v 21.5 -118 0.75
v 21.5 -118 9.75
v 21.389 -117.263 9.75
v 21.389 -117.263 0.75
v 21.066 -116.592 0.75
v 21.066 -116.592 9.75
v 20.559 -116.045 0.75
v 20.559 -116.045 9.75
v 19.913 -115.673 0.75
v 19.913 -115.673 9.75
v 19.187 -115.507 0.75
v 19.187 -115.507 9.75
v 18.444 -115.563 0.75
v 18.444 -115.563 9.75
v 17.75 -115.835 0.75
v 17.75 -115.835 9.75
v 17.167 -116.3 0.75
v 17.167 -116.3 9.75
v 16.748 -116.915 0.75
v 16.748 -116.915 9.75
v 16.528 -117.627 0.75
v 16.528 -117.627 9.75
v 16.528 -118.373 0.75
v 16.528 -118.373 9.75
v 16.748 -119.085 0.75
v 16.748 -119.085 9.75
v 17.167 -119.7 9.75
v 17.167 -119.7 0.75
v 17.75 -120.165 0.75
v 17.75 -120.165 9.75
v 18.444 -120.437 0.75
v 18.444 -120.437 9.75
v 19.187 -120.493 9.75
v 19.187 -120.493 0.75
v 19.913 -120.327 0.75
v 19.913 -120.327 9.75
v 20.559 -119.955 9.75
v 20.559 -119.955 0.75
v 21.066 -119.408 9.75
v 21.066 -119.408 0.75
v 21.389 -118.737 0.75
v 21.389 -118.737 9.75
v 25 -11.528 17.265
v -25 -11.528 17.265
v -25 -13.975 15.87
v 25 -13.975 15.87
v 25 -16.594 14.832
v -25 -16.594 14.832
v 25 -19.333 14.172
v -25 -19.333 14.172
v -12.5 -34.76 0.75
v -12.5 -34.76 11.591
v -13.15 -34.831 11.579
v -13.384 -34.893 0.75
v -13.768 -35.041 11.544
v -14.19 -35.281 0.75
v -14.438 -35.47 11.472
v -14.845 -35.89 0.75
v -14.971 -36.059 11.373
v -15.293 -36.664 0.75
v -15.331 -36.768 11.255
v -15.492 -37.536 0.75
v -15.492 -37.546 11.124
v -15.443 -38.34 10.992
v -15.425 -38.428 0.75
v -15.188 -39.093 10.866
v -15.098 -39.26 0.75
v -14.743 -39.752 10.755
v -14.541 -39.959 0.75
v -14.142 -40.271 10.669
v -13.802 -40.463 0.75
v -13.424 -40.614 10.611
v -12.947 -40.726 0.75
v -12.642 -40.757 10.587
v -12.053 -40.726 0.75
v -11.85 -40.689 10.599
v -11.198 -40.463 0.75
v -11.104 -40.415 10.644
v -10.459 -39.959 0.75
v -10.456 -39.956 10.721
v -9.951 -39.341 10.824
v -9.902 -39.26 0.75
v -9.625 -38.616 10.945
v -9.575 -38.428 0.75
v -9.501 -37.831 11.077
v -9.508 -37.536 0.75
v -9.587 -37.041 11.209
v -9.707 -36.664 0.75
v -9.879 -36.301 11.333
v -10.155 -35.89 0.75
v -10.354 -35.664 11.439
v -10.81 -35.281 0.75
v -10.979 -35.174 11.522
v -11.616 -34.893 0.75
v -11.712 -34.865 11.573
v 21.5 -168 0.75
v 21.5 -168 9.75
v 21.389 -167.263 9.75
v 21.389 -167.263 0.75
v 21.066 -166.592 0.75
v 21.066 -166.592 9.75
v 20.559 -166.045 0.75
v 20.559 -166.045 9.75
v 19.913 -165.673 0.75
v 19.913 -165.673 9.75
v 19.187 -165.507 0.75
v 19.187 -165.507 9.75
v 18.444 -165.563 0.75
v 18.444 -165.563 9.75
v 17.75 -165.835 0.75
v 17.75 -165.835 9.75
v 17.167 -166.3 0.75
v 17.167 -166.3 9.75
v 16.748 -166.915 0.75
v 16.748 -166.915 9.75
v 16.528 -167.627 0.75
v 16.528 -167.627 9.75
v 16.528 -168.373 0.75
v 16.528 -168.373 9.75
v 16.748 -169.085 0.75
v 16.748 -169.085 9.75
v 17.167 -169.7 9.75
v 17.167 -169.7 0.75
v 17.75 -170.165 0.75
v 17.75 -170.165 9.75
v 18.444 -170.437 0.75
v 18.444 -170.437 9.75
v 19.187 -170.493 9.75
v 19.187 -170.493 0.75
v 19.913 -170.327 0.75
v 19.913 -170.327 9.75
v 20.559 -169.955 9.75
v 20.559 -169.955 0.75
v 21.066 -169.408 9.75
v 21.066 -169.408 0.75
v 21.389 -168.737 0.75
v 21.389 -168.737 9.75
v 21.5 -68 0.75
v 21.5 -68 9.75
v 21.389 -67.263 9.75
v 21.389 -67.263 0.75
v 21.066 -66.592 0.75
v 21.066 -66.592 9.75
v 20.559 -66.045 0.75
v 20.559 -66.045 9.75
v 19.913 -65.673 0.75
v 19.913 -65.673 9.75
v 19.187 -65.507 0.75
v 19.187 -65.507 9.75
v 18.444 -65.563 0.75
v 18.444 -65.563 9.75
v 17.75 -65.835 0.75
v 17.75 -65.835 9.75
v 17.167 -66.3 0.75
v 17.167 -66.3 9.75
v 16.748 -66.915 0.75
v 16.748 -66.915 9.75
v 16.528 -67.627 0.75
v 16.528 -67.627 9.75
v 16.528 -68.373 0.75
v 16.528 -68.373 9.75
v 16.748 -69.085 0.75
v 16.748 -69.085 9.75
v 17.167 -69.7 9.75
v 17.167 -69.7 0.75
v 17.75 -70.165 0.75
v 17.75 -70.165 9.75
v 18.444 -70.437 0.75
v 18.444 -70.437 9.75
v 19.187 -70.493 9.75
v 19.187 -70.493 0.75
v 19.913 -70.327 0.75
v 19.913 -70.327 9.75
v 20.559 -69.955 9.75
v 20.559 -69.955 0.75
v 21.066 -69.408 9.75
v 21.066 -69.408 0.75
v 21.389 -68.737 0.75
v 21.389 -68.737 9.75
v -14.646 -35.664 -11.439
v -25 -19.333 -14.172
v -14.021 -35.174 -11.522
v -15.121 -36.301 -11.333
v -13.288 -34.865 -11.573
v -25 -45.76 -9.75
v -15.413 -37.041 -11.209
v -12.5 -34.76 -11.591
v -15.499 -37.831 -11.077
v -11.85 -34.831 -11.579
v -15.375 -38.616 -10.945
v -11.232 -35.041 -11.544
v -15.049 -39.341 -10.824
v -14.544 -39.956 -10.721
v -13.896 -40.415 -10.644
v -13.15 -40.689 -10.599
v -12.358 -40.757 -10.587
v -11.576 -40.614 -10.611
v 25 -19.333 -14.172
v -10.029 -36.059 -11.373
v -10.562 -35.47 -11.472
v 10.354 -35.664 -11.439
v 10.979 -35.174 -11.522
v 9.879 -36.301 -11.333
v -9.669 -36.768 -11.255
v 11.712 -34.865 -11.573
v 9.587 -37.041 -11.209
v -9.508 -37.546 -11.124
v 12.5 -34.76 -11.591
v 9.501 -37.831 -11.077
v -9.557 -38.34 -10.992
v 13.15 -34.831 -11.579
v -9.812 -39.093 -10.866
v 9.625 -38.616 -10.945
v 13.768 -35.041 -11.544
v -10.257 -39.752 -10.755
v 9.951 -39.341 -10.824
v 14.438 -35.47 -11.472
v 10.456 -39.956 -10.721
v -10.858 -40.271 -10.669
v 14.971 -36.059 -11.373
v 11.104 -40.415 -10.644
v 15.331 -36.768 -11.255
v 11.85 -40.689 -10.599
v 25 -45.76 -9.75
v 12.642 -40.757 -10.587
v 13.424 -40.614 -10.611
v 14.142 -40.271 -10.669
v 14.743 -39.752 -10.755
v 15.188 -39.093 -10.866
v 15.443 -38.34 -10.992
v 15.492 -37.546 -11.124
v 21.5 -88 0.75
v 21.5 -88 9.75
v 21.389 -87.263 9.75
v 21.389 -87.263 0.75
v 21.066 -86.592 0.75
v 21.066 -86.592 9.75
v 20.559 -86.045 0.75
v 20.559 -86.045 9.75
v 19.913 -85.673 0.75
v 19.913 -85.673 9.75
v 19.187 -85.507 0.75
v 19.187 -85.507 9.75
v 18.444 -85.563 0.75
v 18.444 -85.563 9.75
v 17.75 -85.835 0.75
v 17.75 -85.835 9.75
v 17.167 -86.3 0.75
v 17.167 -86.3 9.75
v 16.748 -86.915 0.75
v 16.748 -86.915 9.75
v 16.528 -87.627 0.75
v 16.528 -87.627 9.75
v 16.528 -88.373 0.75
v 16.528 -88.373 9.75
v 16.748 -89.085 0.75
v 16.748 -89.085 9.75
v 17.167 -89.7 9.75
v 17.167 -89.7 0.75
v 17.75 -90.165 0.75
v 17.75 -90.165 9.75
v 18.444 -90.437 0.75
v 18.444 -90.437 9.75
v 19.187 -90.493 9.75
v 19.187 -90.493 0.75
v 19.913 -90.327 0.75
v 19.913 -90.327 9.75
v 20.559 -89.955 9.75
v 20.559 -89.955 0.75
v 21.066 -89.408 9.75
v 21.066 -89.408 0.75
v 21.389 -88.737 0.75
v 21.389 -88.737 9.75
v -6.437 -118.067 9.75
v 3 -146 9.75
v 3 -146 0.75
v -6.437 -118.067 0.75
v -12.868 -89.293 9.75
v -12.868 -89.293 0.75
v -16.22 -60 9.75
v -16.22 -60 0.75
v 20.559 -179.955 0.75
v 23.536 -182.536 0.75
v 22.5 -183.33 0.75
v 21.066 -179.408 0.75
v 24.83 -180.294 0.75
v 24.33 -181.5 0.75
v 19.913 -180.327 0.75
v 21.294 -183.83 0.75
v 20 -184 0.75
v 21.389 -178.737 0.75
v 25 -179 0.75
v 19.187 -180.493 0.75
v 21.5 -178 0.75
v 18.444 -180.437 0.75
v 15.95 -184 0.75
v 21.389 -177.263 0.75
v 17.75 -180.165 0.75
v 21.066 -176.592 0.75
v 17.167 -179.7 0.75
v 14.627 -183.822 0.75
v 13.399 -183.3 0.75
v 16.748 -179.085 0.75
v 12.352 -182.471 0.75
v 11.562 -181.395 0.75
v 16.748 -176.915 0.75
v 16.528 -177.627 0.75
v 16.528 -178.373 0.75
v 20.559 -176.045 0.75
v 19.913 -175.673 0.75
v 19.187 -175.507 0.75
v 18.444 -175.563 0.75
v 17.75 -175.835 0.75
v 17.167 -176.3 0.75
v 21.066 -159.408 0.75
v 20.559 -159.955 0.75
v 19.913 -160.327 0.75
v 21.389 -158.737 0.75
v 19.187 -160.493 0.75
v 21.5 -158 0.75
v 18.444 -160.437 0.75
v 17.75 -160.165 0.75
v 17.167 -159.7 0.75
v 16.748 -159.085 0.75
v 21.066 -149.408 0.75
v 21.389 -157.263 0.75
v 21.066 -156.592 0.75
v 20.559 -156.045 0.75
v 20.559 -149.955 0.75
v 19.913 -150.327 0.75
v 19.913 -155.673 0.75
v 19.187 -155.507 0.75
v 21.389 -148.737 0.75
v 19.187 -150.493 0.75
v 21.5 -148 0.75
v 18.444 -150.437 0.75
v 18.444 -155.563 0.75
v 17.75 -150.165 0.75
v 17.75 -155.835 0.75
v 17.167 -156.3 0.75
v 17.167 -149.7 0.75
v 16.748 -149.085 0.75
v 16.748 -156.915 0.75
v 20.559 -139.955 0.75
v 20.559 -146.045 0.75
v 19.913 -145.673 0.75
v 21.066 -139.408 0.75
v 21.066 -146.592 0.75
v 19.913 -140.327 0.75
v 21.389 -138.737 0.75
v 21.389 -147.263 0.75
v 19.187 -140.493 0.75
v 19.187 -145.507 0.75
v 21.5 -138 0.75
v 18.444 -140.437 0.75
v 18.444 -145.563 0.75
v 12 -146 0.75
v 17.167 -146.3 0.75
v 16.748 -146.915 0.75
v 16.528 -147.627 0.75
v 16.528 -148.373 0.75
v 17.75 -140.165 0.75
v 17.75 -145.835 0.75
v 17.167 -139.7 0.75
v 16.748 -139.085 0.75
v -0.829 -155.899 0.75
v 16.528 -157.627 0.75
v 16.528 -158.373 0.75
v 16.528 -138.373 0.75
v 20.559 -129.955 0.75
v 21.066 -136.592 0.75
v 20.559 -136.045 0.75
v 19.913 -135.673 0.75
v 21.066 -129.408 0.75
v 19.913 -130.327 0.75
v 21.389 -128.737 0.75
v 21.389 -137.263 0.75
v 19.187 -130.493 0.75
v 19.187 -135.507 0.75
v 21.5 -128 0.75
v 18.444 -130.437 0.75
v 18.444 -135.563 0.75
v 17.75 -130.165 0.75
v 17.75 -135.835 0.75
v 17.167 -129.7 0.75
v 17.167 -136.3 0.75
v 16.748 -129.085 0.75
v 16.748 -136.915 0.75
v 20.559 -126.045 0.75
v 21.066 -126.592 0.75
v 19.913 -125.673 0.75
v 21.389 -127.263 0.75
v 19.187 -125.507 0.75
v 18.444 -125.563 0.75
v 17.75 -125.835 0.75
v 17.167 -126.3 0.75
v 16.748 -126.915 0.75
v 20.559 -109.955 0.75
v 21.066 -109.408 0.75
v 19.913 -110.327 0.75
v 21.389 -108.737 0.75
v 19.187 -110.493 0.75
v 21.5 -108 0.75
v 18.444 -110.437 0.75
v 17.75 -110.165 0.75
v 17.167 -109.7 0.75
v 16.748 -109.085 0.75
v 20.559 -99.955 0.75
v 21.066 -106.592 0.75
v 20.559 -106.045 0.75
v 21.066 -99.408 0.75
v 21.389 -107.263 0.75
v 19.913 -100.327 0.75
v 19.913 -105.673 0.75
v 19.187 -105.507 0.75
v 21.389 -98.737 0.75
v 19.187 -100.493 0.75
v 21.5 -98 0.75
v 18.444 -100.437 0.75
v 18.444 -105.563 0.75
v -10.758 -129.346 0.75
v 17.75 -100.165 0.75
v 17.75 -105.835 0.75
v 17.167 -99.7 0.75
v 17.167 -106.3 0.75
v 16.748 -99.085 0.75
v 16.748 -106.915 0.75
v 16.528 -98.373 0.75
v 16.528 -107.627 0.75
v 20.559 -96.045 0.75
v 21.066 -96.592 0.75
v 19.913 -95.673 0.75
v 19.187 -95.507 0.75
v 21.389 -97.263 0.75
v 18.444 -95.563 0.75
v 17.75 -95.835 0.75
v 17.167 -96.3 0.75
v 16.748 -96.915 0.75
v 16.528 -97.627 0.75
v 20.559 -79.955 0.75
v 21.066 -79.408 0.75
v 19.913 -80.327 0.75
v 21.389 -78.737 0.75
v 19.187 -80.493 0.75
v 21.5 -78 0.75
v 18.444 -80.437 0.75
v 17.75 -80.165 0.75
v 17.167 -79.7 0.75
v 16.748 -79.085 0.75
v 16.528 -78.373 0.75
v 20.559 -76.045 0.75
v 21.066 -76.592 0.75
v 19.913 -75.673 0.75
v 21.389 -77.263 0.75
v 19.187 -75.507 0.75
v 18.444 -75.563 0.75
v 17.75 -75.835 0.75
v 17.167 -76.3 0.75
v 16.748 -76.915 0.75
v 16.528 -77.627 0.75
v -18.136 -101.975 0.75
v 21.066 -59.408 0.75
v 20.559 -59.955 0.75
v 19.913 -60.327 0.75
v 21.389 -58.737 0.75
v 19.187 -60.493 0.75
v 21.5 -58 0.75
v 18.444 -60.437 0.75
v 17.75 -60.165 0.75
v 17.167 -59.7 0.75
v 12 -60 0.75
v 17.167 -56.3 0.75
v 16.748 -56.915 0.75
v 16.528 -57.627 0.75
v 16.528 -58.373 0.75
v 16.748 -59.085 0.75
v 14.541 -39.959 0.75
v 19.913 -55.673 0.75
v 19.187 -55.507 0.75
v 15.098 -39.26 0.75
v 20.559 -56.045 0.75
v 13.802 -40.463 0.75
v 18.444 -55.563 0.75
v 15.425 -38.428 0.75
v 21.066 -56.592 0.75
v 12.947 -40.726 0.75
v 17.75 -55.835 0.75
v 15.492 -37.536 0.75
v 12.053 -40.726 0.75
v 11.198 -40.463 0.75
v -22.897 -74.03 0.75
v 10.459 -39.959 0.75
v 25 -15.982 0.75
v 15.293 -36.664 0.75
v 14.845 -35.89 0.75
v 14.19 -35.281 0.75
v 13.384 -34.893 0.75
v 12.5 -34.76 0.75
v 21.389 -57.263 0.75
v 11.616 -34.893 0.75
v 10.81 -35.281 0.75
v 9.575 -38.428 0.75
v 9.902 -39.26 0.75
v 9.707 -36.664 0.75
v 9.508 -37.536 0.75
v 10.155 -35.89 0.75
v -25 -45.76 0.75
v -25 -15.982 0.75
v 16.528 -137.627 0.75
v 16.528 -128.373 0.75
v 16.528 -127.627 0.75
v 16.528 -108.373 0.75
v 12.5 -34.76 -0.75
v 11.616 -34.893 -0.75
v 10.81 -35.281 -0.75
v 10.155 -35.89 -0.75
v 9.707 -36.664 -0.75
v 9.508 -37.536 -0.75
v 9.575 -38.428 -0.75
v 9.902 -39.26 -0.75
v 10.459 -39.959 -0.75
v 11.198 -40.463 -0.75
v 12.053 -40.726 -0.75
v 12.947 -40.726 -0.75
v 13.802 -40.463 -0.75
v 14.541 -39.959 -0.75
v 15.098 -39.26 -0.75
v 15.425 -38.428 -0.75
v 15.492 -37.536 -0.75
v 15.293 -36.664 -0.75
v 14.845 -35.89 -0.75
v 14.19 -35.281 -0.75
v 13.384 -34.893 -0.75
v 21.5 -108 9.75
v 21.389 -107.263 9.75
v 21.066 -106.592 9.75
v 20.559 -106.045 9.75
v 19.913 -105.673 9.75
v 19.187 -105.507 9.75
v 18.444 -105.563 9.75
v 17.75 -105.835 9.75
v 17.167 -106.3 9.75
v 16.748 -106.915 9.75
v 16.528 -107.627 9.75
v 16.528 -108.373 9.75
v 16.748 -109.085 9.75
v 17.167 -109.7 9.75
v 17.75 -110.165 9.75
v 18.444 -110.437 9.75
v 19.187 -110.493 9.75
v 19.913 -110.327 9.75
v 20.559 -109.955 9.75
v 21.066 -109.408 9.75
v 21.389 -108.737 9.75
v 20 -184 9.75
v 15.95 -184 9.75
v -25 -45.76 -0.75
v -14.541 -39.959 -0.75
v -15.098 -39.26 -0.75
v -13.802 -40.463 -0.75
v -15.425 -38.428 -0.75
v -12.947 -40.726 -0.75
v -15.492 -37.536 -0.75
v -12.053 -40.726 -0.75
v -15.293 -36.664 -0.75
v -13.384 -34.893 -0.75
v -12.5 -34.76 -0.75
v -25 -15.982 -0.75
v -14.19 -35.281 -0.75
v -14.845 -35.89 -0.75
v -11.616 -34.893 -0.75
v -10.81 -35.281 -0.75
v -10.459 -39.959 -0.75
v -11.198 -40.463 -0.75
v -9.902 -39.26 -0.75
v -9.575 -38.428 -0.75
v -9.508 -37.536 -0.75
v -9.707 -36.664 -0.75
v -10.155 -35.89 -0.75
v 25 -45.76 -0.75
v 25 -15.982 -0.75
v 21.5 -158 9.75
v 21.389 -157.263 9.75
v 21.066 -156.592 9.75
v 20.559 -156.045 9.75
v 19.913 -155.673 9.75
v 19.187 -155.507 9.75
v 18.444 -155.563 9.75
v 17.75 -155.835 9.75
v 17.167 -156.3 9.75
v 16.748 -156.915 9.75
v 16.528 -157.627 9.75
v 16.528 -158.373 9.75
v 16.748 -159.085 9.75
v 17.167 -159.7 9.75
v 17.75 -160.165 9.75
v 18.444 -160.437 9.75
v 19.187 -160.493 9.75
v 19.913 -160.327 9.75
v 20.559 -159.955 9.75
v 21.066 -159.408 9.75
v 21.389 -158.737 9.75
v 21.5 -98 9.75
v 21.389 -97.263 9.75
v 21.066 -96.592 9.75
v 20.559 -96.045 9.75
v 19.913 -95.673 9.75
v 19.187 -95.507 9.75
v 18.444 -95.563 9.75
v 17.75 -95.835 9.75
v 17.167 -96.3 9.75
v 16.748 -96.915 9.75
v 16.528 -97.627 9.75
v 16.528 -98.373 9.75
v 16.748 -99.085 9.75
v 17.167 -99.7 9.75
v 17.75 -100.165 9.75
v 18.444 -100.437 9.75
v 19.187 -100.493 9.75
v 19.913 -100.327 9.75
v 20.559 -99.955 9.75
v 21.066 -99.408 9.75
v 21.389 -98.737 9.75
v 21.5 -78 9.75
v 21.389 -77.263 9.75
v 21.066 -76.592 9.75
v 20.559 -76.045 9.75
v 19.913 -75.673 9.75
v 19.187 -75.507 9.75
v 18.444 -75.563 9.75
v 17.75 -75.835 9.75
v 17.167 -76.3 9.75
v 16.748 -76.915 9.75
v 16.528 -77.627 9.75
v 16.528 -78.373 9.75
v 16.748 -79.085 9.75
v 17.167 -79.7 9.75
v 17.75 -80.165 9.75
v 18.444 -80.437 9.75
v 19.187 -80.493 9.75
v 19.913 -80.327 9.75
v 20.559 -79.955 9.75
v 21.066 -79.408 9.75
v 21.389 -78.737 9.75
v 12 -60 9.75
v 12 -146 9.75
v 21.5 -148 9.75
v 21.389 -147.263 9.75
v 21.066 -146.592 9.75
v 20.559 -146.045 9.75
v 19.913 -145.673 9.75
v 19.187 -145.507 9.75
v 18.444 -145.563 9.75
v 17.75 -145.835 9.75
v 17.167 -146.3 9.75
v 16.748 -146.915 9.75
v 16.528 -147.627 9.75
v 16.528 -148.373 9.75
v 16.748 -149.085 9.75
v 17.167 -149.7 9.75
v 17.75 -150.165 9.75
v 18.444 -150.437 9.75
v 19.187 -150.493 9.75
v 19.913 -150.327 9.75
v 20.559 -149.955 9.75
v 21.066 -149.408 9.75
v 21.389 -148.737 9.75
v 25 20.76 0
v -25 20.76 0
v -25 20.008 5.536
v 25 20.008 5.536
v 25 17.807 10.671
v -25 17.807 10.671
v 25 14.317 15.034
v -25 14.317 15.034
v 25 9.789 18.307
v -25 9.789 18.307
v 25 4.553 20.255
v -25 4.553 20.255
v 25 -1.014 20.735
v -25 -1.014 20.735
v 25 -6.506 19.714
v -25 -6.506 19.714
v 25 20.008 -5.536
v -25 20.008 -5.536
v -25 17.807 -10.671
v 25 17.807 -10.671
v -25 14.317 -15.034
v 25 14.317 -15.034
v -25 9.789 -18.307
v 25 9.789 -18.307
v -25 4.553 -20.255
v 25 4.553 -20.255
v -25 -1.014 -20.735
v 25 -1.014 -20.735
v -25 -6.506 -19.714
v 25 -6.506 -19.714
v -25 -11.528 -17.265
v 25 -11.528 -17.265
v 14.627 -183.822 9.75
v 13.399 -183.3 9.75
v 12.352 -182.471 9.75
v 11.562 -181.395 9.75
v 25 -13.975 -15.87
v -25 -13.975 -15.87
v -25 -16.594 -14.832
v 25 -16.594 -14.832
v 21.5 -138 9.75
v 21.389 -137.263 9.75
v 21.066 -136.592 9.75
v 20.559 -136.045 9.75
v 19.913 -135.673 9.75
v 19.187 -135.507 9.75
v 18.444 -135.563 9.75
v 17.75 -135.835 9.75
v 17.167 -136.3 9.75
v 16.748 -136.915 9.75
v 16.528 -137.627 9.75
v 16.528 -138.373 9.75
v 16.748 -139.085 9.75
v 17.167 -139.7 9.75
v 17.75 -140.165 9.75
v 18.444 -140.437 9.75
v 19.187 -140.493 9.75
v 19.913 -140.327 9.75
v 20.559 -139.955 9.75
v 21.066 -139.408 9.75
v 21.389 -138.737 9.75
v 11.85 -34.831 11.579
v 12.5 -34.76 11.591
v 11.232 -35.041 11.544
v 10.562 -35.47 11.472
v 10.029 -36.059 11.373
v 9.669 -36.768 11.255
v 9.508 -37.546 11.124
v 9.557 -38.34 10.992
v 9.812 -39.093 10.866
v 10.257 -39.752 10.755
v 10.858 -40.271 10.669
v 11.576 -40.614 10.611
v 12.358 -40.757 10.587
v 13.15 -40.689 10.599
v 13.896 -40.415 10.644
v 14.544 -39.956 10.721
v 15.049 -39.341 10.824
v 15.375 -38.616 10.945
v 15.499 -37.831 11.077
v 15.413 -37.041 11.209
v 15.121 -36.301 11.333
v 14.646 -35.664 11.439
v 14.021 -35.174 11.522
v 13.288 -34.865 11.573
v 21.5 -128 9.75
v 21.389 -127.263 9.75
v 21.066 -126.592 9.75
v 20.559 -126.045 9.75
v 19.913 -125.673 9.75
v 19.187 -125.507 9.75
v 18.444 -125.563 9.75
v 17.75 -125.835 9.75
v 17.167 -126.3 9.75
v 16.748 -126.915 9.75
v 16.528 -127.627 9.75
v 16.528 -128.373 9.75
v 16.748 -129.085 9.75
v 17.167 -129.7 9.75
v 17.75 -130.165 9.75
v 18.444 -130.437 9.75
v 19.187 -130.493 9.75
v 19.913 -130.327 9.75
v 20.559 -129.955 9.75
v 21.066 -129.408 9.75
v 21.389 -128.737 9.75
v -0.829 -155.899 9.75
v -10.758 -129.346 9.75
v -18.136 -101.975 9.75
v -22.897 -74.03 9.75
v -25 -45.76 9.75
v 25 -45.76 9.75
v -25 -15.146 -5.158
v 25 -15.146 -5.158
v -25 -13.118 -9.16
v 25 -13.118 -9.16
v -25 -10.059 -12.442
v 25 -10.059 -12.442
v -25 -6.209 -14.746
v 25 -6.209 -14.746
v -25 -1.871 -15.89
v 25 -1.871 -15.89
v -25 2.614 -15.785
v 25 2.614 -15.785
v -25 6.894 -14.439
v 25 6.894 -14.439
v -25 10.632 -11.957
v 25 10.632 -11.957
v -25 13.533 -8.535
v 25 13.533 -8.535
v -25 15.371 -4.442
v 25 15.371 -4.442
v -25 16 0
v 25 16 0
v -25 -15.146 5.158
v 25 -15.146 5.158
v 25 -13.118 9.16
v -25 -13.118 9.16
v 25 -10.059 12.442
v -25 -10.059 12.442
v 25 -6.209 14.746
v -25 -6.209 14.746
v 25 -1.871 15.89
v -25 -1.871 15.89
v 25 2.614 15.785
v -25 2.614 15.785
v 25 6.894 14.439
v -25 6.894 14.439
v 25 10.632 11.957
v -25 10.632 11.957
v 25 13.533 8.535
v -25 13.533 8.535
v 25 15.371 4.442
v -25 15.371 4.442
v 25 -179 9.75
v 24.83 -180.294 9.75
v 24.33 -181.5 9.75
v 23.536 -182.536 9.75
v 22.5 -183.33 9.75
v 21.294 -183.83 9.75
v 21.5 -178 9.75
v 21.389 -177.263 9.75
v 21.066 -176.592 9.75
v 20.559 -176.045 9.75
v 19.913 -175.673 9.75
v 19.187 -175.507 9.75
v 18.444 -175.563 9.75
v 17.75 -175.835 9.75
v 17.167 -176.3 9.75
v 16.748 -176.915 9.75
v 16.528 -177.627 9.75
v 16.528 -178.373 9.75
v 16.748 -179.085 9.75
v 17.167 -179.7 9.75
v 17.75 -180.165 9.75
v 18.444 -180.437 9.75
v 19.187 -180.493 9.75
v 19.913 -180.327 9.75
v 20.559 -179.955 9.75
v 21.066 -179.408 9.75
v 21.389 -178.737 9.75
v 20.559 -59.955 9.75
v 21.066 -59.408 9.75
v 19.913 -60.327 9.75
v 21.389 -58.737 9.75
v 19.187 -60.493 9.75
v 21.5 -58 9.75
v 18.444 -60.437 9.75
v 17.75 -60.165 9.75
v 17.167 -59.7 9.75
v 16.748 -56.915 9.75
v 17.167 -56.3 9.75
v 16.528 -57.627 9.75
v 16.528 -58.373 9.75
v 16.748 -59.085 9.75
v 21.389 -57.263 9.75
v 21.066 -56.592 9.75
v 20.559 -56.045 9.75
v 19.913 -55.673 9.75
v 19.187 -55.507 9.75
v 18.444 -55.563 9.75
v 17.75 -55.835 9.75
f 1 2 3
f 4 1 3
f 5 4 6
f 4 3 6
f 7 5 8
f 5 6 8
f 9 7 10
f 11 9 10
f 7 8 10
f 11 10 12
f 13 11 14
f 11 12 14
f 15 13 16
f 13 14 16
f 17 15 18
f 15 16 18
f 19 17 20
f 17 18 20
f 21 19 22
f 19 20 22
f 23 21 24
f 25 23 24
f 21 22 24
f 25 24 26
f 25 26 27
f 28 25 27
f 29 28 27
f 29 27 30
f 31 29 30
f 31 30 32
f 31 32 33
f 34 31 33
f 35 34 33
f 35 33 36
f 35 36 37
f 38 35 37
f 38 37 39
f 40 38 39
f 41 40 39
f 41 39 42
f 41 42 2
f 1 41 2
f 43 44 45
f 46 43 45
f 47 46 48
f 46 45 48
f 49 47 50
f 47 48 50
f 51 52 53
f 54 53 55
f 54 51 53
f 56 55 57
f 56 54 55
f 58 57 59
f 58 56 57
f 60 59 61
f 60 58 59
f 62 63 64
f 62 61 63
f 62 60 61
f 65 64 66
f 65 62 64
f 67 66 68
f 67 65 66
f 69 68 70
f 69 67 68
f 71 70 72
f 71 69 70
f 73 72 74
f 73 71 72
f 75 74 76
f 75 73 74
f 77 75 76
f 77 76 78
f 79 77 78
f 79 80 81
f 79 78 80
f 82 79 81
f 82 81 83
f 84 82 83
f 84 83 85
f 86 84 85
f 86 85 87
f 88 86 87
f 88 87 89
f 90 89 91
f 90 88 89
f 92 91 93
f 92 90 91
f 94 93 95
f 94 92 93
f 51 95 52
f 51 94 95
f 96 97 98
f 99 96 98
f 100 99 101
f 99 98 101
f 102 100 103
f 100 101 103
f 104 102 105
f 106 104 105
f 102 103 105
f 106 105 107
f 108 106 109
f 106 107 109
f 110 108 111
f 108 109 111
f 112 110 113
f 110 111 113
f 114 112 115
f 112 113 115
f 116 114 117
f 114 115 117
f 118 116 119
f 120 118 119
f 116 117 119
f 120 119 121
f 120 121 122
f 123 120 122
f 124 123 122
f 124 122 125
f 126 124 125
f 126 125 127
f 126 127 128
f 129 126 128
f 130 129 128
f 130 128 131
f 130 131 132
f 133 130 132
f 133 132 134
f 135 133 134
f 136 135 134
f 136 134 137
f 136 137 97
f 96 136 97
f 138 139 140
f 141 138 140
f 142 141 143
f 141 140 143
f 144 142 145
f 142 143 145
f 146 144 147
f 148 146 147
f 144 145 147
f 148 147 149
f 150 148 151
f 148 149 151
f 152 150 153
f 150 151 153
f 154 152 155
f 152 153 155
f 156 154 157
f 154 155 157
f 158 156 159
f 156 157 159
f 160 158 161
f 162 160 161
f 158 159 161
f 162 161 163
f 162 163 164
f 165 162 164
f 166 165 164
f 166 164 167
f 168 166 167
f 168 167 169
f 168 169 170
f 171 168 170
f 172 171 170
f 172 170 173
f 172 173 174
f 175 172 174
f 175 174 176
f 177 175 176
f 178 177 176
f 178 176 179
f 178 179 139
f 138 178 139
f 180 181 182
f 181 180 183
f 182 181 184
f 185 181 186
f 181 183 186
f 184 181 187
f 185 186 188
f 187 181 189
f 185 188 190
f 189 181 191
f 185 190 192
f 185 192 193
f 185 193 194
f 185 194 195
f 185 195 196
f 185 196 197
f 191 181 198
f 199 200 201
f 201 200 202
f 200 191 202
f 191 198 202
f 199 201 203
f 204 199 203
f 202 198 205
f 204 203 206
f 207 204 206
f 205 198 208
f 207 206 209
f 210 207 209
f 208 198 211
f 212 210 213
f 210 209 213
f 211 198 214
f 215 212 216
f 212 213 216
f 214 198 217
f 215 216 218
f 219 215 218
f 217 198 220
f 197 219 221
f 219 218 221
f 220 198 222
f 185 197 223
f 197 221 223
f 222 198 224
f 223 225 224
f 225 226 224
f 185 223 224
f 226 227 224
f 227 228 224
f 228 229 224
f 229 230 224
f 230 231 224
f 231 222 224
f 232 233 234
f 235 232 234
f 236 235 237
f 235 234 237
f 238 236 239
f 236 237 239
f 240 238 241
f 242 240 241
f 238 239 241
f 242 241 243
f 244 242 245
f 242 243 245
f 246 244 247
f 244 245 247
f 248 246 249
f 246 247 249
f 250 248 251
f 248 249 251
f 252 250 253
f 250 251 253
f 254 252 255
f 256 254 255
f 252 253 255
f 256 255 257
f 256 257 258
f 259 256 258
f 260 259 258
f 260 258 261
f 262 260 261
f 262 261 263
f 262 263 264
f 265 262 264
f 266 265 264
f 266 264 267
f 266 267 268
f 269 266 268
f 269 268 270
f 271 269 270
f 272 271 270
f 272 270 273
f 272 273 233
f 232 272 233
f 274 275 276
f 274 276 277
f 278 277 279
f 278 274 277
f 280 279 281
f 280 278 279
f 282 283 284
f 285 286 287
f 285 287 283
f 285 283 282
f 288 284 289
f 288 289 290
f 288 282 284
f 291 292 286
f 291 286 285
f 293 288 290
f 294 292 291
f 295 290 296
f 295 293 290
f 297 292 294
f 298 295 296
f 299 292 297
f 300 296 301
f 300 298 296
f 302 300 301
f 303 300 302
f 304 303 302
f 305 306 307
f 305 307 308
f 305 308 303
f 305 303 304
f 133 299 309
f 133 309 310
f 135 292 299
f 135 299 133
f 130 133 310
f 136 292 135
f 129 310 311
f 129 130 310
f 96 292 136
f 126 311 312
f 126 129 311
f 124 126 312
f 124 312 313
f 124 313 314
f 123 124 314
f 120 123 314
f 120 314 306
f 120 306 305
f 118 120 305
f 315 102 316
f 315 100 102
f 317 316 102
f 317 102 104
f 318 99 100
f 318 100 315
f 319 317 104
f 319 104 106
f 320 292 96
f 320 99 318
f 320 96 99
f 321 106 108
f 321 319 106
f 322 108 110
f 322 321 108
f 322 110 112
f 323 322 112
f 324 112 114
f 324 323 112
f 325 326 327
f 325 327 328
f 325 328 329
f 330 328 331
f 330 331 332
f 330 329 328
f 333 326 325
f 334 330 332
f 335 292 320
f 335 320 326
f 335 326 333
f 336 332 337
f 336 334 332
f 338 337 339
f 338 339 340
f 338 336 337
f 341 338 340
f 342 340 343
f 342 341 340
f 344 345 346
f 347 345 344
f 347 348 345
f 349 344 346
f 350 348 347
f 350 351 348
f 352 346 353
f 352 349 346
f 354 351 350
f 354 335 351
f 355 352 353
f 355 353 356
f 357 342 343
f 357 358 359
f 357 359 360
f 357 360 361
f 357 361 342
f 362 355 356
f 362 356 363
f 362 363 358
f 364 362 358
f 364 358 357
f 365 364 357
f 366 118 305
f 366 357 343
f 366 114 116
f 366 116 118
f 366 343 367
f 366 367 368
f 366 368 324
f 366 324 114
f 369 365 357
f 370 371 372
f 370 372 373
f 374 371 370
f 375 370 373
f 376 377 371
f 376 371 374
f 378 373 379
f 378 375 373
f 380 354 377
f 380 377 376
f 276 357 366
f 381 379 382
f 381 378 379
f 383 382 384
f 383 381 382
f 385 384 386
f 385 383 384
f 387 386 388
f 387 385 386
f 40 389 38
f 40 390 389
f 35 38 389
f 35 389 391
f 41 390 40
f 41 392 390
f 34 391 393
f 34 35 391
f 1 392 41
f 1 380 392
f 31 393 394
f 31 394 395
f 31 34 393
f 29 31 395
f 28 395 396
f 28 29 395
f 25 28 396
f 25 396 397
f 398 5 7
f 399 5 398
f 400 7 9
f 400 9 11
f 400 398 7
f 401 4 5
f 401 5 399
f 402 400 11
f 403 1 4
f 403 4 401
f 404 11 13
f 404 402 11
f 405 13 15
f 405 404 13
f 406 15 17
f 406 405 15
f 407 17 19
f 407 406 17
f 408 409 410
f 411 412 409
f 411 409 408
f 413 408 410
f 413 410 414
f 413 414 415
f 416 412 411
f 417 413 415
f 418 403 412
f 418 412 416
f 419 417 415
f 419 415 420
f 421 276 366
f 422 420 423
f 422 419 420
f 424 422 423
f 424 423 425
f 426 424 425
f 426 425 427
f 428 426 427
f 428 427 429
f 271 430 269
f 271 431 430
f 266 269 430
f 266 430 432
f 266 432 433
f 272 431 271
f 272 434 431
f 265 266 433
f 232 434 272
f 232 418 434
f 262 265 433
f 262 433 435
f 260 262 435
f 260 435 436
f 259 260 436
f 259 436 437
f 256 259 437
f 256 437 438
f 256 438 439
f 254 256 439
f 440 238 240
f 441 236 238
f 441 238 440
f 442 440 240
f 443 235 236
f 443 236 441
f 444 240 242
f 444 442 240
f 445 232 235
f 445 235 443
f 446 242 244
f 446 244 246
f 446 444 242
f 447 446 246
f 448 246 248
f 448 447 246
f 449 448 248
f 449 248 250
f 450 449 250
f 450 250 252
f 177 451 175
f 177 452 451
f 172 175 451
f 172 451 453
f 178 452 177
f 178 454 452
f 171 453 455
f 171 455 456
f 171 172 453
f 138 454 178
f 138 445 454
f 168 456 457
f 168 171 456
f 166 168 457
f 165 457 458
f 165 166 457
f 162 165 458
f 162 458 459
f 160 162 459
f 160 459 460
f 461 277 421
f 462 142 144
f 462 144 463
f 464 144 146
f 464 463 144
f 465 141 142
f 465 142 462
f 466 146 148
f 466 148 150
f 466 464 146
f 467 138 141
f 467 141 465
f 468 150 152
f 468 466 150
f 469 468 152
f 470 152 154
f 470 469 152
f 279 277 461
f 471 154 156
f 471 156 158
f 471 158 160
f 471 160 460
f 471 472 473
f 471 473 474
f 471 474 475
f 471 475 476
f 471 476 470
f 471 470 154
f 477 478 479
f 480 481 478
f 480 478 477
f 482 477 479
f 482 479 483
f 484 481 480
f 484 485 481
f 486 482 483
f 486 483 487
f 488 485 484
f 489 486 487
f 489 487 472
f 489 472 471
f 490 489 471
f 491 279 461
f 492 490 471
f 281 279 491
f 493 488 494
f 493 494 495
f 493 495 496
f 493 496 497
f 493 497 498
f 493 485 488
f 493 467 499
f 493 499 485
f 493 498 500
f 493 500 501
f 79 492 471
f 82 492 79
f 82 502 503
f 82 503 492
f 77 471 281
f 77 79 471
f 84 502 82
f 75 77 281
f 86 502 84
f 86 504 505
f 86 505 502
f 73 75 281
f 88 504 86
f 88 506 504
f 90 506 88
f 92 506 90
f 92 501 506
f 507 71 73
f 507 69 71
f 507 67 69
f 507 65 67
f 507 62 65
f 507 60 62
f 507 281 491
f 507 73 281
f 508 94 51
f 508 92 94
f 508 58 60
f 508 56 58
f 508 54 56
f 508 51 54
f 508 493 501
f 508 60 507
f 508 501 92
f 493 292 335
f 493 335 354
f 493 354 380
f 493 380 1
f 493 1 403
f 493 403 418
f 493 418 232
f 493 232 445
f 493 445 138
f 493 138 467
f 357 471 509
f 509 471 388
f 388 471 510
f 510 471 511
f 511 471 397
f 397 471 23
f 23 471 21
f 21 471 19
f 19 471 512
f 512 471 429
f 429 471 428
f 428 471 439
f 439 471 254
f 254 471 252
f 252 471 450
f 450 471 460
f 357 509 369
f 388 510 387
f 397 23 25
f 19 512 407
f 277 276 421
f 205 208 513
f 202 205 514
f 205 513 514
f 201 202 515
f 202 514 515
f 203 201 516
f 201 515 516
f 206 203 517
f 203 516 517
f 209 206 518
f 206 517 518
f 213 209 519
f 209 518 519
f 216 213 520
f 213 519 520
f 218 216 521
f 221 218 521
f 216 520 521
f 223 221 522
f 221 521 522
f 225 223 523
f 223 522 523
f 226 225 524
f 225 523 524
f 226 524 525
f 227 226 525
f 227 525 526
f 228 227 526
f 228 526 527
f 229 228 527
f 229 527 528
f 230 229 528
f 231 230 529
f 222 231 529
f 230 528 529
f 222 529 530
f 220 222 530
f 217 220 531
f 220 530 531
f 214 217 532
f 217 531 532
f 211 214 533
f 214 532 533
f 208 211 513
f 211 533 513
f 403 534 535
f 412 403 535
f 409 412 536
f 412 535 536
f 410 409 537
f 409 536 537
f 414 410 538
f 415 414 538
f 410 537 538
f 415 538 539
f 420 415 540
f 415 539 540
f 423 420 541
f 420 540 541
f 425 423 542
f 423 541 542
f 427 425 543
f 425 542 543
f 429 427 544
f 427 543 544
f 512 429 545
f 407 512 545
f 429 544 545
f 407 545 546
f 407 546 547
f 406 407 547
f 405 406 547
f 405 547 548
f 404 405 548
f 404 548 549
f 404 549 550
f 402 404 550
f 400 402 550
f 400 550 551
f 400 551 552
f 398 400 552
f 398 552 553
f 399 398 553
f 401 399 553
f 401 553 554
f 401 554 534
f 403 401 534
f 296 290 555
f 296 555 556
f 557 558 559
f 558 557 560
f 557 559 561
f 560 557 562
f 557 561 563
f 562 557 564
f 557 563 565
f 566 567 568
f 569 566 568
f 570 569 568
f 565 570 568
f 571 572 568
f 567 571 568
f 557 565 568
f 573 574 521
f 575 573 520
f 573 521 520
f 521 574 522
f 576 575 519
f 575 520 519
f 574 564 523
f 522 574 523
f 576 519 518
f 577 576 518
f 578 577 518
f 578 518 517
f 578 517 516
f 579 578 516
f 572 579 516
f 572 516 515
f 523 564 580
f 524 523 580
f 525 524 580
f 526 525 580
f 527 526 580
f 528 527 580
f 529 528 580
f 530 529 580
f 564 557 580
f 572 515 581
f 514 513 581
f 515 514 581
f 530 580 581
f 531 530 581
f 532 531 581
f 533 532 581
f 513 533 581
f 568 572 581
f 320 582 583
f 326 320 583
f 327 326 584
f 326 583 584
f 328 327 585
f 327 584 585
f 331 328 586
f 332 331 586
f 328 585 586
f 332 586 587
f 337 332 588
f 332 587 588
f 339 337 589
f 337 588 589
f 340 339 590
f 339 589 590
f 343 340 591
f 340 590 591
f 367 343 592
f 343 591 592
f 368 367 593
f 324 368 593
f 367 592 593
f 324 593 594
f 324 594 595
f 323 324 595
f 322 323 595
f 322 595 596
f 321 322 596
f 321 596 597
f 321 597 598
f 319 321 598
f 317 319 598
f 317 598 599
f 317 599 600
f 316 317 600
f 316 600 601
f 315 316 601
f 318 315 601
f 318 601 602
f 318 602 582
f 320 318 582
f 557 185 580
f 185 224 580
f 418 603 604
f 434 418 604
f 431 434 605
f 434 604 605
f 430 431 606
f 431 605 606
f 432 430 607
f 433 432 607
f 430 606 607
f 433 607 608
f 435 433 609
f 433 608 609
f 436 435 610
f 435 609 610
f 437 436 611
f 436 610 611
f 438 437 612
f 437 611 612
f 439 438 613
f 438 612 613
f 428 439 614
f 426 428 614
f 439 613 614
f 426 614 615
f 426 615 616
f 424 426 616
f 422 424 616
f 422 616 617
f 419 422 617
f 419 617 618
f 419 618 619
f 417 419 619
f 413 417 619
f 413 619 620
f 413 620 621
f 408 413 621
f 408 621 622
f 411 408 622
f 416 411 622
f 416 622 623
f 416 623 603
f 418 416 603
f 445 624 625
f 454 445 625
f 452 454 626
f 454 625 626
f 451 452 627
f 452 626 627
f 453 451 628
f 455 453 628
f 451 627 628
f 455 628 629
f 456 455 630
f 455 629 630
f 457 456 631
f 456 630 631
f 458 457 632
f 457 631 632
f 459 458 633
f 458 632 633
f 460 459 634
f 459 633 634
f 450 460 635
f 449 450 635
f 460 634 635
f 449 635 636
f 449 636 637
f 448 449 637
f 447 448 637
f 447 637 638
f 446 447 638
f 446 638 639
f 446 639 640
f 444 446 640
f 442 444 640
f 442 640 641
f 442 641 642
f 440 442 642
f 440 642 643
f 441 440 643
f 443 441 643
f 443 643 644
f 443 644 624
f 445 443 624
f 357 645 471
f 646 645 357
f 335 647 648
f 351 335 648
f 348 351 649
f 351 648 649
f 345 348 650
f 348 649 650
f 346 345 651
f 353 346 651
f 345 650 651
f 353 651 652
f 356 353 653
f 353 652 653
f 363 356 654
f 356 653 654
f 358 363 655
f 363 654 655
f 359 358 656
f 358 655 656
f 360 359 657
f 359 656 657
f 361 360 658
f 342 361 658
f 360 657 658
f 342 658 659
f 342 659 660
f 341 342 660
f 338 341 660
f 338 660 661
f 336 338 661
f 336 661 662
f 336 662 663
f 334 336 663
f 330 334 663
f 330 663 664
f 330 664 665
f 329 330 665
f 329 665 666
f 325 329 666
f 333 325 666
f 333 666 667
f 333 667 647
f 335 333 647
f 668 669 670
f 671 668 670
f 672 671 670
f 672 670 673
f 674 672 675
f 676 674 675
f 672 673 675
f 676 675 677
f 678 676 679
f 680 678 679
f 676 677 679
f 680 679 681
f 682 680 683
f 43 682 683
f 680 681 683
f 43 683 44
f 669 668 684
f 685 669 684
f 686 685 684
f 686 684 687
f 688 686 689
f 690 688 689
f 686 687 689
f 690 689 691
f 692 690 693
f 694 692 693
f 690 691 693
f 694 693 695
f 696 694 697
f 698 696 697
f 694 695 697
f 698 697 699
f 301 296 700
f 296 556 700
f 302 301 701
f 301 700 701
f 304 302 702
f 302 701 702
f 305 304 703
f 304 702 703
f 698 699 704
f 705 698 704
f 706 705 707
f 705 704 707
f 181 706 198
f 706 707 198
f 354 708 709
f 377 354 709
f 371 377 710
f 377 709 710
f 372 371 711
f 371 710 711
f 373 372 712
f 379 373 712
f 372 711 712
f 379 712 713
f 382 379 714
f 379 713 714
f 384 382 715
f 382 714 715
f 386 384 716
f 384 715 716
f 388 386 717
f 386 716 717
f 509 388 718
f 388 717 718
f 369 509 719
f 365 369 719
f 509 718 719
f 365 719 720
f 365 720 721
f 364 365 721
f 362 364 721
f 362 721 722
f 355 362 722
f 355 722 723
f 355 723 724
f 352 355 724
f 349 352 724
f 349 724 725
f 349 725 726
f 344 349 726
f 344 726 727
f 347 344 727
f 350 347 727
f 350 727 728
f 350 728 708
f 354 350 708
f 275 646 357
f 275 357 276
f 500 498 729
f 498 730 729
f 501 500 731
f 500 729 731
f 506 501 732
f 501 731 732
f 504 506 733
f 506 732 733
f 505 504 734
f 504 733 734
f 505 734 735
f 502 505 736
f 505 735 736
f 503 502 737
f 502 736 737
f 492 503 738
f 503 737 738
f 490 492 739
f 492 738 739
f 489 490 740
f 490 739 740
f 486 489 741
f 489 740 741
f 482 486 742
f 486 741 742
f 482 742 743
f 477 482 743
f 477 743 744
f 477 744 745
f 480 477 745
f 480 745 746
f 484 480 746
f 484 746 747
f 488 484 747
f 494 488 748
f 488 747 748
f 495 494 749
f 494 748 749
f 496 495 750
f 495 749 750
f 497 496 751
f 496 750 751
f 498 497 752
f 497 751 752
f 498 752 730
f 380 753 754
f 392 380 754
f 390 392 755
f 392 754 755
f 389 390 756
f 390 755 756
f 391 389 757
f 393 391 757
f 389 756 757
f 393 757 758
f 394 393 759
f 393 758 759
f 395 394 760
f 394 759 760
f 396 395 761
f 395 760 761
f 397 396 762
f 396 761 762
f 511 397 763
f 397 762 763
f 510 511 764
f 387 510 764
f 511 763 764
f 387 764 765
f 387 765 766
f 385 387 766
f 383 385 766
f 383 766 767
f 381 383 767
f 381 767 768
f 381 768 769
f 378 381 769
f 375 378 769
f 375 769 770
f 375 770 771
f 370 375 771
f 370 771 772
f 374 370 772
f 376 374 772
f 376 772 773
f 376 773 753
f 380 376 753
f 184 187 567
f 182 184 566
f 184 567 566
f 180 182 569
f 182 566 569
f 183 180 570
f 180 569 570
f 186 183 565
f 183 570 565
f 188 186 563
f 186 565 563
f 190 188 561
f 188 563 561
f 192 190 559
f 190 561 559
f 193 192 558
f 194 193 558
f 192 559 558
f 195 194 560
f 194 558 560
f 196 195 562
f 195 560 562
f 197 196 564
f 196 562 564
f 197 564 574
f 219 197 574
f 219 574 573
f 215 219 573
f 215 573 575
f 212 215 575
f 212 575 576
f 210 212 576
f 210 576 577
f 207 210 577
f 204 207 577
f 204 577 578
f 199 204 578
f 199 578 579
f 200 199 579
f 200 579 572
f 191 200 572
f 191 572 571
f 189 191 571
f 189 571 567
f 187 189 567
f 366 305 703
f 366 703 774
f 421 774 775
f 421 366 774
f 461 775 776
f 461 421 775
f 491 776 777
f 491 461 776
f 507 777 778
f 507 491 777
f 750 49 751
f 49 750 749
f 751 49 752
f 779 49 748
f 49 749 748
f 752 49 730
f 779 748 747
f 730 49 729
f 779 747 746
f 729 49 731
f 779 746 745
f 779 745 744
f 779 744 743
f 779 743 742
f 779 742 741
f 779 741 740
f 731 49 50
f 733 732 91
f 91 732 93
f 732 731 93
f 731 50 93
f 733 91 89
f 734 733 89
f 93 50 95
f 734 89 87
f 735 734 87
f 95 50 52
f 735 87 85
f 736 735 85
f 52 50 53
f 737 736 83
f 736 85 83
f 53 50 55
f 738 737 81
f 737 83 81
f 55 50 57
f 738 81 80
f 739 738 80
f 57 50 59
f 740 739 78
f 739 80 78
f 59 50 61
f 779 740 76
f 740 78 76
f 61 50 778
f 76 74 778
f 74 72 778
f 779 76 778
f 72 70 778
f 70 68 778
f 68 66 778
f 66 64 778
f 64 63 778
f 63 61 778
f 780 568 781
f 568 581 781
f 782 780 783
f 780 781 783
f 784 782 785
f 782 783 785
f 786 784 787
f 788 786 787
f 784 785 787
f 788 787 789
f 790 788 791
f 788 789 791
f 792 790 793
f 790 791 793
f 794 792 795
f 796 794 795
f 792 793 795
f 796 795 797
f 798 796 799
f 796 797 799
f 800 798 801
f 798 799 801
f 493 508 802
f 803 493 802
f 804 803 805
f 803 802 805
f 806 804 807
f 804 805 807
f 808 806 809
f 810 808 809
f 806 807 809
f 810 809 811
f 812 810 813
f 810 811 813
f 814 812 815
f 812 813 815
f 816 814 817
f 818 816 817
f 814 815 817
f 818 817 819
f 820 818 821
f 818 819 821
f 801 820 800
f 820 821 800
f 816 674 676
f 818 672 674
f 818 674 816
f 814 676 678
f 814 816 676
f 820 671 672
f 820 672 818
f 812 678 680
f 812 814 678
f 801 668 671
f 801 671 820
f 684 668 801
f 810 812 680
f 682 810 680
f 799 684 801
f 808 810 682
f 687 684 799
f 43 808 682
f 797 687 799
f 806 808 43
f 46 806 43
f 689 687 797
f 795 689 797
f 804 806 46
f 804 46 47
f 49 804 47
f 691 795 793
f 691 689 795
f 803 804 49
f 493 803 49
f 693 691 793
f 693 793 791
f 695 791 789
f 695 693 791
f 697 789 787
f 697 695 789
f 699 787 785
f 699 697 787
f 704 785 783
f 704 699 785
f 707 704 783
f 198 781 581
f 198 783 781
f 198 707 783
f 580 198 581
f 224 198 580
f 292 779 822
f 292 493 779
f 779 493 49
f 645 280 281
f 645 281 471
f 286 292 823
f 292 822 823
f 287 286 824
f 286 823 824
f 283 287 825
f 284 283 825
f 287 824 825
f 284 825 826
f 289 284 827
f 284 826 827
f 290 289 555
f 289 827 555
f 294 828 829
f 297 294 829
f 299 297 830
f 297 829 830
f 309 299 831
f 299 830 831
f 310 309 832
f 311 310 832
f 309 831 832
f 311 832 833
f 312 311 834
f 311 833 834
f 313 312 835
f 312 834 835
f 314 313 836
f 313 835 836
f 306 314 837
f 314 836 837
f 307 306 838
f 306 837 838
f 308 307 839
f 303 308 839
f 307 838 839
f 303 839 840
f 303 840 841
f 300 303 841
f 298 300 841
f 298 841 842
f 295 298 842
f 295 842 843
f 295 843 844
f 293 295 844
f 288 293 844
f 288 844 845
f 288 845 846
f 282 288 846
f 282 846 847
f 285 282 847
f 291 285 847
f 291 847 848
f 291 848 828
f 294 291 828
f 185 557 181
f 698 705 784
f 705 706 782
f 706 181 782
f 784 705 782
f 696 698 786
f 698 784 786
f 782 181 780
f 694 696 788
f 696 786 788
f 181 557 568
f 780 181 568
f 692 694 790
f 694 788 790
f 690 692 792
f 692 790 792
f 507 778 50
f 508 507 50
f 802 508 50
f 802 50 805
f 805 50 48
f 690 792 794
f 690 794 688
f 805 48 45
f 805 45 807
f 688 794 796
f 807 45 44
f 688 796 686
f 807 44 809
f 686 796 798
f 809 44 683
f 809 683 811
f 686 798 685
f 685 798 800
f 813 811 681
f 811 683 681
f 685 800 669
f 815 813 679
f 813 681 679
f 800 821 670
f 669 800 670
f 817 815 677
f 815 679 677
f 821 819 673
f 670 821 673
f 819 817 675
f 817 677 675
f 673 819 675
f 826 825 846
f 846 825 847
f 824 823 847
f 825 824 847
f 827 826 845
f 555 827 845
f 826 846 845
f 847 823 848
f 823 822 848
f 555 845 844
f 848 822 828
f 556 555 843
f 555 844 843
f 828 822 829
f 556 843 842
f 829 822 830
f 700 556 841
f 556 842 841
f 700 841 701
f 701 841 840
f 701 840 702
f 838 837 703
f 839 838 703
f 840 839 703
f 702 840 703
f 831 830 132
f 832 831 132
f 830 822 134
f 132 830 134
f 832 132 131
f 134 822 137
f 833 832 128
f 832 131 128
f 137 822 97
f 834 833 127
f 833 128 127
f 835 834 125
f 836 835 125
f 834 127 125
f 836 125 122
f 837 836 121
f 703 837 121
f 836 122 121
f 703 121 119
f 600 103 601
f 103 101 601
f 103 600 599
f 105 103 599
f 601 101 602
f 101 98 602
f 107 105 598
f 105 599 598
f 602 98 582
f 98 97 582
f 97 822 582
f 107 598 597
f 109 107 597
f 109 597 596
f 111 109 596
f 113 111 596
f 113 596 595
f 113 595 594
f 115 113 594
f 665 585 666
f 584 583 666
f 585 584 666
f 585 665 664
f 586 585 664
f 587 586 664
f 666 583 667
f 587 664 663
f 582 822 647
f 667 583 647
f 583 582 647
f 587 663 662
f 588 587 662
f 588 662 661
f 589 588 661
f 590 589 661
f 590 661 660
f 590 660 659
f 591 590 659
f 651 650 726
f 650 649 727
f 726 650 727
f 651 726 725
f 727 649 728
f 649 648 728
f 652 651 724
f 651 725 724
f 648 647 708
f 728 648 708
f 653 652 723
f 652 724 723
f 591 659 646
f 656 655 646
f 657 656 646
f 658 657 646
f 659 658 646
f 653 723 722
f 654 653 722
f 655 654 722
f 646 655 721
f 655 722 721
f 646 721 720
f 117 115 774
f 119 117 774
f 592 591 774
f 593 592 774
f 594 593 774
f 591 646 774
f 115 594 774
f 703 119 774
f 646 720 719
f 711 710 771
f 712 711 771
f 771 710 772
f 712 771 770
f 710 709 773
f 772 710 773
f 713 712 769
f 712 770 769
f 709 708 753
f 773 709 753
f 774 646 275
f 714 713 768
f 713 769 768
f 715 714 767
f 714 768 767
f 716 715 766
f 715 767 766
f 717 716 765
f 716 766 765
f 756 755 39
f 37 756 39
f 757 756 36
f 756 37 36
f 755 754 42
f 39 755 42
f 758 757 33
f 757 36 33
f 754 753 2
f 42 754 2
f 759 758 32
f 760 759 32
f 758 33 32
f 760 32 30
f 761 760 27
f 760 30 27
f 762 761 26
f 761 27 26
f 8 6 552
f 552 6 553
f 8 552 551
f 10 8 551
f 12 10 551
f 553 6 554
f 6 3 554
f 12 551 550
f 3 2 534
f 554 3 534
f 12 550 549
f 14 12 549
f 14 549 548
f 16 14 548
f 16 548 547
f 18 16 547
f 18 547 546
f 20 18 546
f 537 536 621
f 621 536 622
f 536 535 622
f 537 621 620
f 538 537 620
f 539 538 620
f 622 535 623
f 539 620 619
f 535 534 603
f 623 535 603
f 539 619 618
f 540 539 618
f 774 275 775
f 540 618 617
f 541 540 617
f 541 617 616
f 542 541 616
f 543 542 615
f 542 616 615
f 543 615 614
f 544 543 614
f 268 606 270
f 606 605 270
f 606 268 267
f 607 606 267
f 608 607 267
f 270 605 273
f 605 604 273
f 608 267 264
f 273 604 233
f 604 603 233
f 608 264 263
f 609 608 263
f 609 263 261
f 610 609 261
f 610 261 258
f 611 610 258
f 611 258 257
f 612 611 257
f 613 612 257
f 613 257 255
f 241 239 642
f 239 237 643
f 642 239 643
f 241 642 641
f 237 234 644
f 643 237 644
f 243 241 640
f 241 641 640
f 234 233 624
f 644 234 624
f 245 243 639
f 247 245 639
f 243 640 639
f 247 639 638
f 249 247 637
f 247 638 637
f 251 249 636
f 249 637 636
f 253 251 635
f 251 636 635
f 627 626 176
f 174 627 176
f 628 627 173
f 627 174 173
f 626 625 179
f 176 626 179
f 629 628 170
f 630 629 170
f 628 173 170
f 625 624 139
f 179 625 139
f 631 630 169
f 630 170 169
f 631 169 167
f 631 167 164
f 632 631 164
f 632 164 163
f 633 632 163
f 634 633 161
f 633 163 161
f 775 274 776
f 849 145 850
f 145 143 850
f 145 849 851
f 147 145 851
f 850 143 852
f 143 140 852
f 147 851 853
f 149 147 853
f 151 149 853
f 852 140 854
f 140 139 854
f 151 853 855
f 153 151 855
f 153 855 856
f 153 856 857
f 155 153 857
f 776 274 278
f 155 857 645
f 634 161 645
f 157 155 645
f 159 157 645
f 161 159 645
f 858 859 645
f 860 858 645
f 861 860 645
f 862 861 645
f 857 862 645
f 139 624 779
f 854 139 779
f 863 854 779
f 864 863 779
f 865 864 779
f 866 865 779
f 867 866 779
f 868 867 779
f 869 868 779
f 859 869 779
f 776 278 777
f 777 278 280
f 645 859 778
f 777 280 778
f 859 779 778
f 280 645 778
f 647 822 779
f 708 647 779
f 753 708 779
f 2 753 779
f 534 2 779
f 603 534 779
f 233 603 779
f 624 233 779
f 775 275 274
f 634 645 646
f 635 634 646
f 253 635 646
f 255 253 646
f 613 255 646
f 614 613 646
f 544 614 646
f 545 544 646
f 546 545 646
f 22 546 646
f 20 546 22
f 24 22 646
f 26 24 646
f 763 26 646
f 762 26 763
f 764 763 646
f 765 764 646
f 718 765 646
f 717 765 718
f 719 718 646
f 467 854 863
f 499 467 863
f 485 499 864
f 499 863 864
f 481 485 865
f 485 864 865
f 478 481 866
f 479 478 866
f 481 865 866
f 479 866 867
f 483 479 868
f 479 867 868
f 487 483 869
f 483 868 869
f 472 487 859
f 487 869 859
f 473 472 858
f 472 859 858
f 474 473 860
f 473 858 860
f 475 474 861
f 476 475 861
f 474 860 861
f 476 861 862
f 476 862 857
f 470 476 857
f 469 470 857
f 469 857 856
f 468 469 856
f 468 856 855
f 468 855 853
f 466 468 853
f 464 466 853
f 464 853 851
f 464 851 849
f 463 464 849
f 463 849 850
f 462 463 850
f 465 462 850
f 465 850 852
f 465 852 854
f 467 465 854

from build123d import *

# Parameters (mm, degrees)
RESSALTO_EXTRUS_O1_DEPTH = 25
ESPELHAR1_START          = -25
ESPELHAR1_DEPTH          = 50
ESBO_O10_R               = 3
CORTE_EXTRUS_O6_DEPTH    = 44.5
RESSALTO_EXTRUS_O2_START = 0.75
RESSALTO_EXTRUS_O2_DEPTH = 9
ESBO_O12_R               = 2.5
CORTE_EXTRUS_O7_DEPTH    = 189.180392443
PADR_O_LINEAR1_COUNT     = 13
PADR_O_LINEAR1_PITCH     = 10
CORTE_EXTRUS_O8_DEPTH    = 189.180392443
FILETE1_R                = 5


# Read off the part's stored shape, not the designer's step: Espelhar1
with BuildPart() as part:
    # Esboço2 → Ressalto-extrusão1 (new, symmetric)
    with BuildSketch(Plane(origin=(0, 0, 0), x_dir=(0, 0, -1), z_dir=(1, 0, 0))):
        with BuildLine():
            Line((14.172351725, -19.333068153), (9.75, -45.76))
            Line((9.75, -45.76), (0.75, -45.76))
            Line((0.75, -45.76), (0.75, -15.982412208))
            ThreePointArc((0.75, -15.982412208), (15.995602448, 0.375103096), (0, 16))
            Line((0, 16), (0, 20.76))
            ThreePointArc((0, 20.76), (18.307093974, 9.789173112), (17.265058969, -11.528024063))
            ThreePointArc((17.265058969, -11.528024063), (15.304550089, -15.266439288), (14.172351725, -19.333068153))
        make_face()
    extrude(amount=RESSALTO_EXTRUS_O1_DEPTH, both=True)

    # Espelhar1 outline → Espelhar1 (add)
    with BuildSketch(Plane.YZ.offset(ESPELHAR1_START)):
        with BuildLine():
            Line((-19.333068153, 14.172351725), (-45.76, 9.75))
            Line((-45.76, 9.75), (-45.76, 0.75))
            Line((-45.76, 0.75), (-15.982412208, 0.75))
            ThreePointArc((-15.982412208, 0.75), (0.375103096, 15.995602448), (16, 0))
            Line((16, 0), (20.76, 0))
            ThreePointArc((20.76, 0), (9.789173112, 18.307093974), (-11.528024063, 17.265058969))
            ThreePointArc((-11.528024063, 17.265058969), (-15.266439288, 15.304550089), (-19.333068153, 14.172351725))
        make_face()
    extrude(amount=ESPELHAR1_DEPTH)

    # Esboço10 → Corte-extrusão6 (cut, symmetric)
    with BuildSketch(Plane.XY):
        with Locations(Location((-12.5, -37.76, 0), (0, 0, 90))):
            Circle(ESBO_O10_R)
        with Locations(Location((12.5, -37.76, 0), (0, 0, 90))):
            Circle(ESBO_O10_R)
    extrude(amount=CORTE_EXTRUS_O6_DEPTH, both=True, mode=Mode.SUBTRACT)

    # Esboço11 → Ressalto-extrusão2 (add)
    with BuildSketch(Plane.XY.offset(RESSALTO_EXTRUS_O2_START)):
        with BuildLine():
            Line((-25, -45.76), (25, -45.76))
            Line((25, -45.76), (25, -184))
            Line((25, -184), (13, -184))
            ThreePointArc((13, -184), (-14.37934254, -117.183349367), (-25, -45.76))
        make_face()
    extrude(amount=RESSALTO_EXTRUS_O2_DEPTH)

    # Esboço12 → Corte-extrusão7 (cut, through all)
    with BuildSketch(Plane.XY.offset(9.75)):
        with Locations((19, -178)):
            Circle(ESBO_O12_R)
    corte_extrus_o7 = extrude(amount=-CORTE_EXTRUS_O7_DEPTH, mode=Mode.SUBTRACT)

    # Padrão linear1: Corte-extrusão7 ×13
    with Locations(*[(0, i * PADR_O_LINEAR1_PITCH, 0) for i in range(1, PADR_O_LINEAR1_COUNT)]):
        add(corte_extrus_o7, mode=Mode.SUBTRACT)

    # Esboço13 → Corte-extrusão8 (cut, through all)
    with BuildSketch(Plane.XY.offset(9.75)):
        with BuildLine():
            Line((-16.219640416, -60), (12, -60))
            Line((12, -60), (12, -146))
            Line((12, -146), (3, -146))
            ThreePointArc((3, -146), (-10.033576546, -103.765155415), (-16.219640416, -60))
        make_face()
    extrude(amount=-CORTE_EXTRUS_O8_DEPTH, mode=Mode.SUBTRACT)

    # Filete1
    filete1_edges = [part.edges().sort_by_distance(p)[0] for p in [
        (13, -184, 5.25),
        (25, -184, 5.25),
    ]]
    fillet(filete1_edges, radius=FILETE1_R)


solid = part.part
